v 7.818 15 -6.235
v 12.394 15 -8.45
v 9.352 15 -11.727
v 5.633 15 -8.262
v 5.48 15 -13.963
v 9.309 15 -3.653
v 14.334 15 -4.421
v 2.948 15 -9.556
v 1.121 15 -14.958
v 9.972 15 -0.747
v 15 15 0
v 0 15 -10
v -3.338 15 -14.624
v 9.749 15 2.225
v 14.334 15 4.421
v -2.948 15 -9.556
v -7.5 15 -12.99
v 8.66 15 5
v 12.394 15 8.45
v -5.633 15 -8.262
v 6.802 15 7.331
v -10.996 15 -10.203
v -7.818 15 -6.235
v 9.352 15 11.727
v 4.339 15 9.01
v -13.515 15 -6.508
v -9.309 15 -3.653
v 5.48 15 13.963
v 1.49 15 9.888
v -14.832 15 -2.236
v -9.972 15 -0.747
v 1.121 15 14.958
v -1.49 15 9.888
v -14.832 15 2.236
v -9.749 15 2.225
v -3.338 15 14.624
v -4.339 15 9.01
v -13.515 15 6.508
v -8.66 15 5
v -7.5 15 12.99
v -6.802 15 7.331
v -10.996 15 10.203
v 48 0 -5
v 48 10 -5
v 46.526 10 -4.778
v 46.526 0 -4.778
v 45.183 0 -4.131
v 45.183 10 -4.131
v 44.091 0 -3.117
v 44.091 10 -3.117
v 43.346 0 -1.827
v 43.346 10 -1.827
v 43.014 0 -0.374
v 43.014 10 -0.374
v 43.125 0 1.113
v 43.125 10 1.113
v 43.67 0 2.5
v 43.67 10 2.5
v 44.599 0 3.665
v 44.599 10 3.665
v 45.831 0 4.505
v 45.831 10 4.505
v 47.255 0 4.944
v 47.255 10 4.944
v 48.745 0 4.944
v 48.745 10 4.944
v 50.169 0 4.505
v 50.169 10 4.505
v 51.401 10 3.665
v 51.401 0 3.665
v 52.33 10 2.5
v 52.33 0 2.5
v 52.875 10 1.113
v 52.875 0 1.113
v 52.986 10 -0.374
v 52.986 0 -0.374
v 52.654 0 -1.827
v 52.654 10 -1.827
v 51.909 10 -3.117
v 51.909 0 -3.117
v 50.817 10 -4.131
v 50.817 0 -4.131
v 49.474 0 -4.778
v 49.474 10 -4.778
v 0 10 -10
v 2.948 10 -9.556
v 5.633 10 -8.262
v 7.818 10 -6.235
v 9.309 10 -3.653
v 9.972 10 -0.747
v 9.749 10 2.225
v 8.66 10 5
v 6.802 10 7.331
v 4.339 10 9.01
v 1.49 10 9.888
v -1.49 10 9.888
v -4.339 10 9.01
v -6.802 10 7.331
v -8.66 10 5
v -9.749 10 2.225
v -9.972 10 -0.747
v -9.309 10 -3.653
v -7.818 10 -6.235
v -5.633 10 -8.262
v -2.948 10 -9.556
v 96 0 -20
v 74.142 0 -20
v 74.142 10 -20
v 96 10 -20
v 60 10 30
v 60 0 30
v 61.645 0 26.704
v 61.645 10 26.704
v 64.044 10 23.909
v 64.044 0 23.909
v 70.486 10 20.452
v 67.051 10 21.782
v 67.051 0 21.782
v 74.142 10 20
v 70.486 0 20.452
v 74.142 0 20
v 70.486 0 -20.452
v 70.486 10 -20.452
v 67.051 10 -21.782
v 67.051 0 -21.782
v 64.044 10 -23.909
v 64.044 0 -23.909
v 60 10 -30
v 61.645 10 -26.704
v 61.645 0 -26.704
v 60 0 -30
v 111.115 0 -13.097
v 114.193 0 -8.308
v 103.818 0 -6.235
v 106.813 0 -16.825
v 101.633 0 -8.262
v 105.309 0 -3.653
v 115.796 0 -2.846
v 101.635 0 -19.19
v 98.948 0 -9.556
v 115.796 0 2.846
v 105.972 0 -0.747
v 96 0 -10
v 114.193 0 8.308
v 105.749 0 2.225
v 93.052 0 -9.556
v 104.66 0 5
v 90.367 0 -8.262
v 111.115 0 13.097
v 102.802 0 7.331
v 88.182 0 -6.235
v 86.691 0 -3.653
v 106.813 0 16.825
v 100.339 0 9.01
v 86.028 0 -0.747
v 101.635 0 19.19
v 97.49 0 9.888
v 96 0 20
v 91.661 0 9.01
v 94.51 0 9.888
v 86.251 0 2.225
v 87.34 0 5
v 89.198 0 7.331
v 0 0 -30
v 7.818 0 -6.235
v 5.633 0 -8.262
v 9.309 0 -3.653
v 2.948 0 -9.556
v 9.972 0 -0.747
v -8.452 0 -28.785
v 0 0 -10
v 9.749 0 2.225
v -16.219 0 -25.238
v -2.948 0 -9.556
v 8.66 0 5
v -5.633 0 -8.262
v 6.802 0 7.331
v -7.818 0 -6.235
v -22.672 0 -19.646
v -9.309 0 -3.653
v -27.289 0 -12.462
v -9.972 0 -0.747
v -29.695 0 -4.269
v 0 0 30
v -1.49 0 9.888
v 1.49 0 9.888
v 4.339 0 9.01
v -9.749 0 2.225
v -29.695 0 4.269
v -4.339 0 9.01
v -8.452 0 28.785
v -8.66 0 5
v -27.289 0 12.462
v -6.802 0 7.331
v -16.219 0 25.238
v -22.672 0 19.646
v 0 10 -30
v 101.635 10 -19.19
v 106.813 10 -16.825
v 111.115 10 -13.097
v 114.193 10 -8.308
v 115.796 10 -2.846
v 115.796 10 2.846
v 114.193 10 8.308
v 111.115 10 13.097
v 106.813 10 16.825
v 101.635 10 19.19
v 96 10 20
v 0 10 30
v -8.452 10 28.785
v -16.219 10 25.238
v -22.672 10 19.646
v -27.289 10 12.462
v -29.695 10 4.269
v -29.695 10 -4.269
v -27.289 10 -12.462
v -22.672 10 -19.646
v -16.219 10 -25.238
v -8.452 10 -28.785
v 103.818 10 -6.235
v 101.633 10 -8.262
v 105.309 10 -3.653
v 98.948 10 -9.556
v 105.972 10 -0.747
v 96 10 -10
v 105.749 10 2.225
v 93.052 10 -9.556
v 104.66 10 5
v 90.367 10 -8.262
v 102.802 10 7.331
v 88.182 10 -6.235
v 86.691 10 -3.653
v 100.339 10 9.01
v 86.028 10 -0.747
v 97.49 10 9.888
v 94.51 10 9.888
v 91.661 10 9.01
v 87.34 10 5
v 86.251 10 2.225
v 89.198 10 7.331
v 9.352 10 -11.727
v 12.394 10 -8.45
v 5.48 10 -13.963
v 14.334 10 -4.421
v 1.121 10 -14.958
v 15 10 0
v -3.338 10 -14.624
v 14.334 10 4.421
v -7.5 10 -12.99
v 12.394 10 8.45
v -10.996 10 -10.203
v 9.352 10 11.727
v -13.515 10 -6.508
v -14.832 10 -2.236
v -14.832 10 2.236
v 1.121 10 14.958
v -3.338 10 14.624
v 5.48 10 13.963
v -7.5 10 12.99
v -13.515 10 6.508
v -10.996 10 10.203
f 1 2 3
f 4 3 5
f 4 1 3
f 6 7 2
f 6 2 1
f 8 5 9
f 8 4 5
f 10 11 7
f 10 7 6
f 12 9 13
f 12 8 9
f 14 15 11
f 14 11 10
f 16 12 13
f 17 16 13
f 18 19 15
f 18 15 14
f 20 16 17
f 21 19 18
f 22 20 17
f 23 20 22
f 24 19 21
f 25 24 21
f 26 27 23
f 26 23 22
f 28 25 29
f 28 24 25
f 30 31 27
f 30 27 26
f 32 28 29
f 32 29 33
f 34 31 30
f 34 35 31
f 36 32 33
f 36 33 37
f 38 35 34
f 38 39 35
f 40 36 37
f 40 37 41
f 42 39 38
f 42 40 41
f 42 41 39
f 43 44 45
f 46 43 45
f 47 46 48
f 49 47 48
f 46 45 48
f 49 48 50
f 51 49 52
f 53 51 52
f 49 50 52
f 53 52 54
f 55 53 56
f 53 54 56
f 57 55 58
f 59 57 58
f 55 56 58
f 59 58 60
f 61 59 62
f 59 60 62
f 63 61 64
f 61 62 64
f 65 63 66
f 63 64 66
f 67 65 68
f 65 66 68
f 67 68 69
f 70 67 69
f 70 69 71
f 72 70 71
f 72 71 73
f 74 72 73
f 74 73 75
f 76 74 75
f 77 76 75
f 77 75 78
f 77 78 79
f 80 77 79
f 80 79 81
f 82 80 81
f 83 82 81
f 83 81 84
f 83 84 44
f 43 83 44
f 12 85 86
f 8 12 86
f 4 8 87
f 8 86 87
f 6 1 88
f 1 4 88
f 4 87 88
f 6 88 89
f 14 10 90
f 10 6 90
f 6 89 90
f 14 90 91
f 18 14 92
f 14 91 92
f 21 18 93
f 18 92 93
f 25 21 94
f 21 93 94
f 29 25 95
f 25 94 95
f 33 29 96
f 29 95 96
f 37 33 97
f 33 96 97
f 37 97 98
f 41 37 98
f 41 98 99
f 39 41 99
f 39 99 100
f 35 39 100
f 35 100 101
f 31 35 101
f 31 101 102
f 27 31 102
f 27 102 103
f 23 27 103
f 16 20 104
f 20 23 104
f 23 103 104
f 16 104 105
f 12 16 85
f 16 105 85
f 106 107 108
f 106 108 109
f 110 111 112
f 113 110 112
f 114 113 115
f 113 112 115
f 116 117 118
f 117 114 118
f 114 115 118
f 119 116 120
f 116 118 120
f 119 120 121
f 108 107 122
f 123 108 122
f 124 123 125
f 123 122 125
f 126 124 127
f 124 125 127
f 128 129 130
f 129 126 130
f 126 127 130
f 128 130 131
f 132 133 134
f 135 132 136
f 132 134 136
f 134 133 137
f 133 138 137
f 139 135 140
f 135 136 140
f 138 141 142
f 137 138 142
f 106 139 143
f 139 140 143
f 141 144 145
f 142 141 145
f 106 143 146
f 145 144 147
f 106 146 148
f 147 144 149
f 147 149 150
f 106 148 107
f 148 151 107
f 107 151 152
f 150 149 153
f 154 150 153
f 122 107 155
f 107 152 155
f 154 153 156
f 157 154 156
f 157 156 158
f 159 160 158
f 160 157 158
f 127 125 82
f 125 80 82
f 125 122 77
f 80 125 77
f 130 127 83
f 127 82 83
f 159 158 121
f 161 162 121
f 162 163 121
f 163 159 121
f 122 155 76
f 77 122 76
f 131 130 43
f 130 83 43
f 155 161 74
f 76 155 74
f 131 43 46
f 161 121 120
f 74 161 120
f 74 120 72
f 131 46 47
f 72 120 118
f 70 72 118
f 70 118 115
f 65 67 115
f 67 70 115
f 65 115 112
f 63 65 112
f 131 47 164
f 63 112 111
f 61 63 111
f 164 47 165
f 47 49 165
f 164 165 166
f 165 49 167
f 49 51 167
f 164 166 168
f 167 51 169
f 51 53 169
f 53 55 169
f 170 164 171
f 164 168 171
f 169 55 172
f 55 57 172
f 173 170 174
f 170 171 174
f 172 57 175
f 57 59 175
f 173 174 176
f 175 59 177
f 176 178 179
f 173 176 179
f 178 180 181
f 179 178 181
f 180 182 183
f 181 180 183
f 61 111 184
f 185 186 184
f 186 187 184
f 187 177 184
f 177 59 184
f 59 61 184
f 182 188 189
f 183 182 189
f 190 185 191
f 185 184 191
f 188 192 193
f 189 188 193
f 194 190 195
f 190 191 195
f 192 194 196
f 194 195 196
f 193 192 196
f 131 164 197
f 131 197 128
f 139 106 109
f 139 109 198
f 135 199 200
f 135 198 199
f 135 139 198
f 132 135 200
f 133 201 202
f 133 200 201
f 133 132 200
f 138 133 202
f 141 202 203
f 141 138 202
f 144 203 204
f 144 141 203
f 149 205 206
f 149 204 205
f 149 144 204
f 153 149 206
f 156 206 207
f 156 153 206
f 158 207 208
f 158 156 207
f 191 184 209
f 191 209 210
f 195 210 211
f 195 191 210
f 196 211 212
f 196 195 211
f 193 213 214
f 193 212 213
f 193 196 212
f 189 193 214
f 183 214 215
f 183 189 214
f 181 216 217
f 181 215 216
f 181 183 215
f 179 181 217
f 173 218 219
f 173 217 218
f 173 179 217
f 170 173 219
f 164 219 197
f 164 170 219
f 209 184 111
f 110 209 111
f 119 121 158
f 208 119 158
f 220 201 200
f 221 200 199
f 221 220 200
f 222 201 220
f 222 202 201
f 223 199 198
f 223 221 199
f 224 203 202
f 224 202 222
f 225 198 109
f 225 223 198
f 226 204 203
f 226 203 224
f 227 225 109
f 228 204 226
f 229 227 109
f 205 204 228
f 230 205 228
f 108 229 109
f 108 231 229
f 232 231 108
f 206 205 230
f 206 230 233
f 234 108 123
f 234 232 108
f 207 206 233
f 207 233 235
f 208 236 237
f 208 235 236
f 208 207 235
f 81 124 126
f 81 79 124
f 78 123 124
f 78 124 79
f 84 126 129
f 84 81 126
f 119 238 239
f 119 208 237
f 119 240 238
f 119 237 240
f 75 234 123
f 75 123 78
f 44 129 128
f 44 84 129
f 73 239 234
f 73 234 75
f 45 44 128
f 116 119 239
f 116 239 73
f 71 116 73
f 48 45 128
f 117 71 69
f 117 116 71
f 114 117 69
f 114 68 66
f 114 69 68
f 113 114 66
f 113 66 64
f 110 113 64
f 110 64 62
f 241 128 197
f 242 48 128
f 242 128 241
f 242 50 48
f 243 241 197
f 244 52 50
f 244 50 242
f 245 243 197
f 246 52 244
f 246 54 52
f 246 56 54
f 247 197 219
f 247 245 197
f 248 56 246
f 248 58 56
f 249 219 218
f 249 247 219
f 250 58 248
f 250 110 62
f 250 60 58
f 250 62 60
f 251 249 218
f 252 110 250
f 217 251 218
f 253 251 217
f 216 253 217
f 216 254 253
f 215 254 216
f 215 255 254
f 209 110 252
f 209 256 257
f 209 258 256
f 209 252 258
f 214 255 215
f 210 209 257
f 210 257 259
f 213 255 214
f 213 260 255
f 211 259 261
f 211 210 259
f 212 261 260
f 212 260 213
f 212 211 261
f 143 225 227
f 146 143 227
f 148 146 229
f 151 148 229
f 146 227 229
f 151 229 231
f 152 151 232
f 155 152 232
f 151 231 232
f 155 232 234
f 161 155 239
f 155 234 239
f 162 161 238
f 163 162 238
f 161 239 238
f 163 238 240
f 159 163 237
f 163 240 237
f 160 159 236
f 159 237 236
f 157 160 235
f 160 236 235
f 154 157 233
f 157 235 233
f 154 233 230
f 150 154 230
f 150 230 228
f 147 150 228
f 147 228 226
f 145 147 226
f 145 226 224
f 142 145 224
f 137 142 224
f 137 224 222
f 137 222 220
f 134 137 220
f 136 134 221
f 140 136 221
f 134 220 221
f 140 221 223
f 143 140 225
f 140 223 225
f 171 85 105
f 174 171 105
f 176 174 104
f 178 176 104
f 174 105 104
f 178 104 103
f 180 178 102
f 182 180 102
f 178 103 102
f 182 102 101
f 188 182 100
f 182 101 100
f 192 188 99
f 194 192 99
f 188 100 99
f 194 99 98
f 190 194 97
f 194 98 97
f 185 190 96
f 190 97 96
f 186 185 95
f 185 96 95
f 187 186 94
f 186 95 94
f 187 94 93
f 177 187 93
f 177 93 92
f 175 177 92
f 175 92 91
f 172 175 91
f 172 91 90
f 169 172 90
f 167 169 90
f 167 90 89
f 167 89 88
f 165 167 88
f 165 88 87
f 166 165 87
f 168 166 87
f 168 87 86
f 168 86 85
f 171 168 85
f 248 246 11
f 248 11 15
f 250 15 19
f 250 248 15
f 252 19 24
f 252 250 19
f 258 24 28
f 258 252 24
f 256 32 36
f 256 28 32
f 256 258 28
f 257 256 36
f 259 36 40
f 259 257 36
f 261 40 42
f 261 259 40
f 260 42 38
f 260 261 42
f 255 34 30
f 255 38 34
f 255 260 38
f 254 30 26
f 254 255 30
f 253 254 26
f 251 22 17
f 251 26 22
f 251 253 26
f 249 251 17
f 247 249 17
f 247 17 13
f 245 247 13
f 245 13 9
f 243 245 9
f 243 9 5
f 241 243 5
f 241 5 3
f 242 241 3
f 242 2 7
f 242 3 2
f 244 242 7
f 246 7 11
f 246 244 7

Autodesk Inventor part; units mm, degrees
ref_plane "YZ Plane" through (0, 0, 0) normal (1, 0, 0) x (0, 1, 0)
ref_plane "XZ Plane" through (0, 0, 0) normal (0, 1, 0) x (-1, 0, 0)
ref_plane "XY Plane" through (0, 0, 0) normal (0, 0, 1) x (1, 0, 0)
sketch "Sketch1" plane through (0, 0, 0) normal (0, 1, 0) x (-1, 0, 0)
  arc A0 (0, -30) -> (0, 30) centre (0, 0) ccw
  line L0 (0, -30) -> (-60, -30)
  arc A1 (-60, -30) -> (-74.1421, -20) centre (-74.1421, -35) ccw
  line L1 (-74.1421, -20) -> (-96, -20)
  line L2 (0, 0) -> (-48, 0)
  line L3 (-48, 0) -> (-96, 0)
  line L4 (0, 30) -> (-60, 30)
  arc A2 (-74.1421, 20) -> (-60, 30) centre (-74.1421, 35) ccw
  line L5 (-74.1421, 20) -> (-96, 20)
  arc A3 (-96, 20) -> (-96, -20) centre (-96, 0) ccw
  dimension "d1" = 30
  dimension "d2" = 48
  dimension "d3" = 60
  dimension "d4" = 15
  dimension "d5" = 20
  dimension "d6" = 96
extrude "Extrusion1" add sketch "Sketch1" along normal blind 10
hole "Hole2" at (0, 0, 0) at (96, 0, 0) direction (0, 1, 0) diameter 20 end through all
hole "Hole3" at (48, 0, 0) at (0, 0, 0) direction (0, 1, 0) diameter 10 end through all
sketch "Sketch3" plane through (0, 10, 0) normal (0, 1, 0) x (1, 0, 0)
  circle A0 centre (0, 0) radius 15
  dimension "d30" = 30
emboss "Emboss1" sketch "Sketch3" operation add depth 5 direction (0, -1, 0)
properties part number "SwivelBase"
